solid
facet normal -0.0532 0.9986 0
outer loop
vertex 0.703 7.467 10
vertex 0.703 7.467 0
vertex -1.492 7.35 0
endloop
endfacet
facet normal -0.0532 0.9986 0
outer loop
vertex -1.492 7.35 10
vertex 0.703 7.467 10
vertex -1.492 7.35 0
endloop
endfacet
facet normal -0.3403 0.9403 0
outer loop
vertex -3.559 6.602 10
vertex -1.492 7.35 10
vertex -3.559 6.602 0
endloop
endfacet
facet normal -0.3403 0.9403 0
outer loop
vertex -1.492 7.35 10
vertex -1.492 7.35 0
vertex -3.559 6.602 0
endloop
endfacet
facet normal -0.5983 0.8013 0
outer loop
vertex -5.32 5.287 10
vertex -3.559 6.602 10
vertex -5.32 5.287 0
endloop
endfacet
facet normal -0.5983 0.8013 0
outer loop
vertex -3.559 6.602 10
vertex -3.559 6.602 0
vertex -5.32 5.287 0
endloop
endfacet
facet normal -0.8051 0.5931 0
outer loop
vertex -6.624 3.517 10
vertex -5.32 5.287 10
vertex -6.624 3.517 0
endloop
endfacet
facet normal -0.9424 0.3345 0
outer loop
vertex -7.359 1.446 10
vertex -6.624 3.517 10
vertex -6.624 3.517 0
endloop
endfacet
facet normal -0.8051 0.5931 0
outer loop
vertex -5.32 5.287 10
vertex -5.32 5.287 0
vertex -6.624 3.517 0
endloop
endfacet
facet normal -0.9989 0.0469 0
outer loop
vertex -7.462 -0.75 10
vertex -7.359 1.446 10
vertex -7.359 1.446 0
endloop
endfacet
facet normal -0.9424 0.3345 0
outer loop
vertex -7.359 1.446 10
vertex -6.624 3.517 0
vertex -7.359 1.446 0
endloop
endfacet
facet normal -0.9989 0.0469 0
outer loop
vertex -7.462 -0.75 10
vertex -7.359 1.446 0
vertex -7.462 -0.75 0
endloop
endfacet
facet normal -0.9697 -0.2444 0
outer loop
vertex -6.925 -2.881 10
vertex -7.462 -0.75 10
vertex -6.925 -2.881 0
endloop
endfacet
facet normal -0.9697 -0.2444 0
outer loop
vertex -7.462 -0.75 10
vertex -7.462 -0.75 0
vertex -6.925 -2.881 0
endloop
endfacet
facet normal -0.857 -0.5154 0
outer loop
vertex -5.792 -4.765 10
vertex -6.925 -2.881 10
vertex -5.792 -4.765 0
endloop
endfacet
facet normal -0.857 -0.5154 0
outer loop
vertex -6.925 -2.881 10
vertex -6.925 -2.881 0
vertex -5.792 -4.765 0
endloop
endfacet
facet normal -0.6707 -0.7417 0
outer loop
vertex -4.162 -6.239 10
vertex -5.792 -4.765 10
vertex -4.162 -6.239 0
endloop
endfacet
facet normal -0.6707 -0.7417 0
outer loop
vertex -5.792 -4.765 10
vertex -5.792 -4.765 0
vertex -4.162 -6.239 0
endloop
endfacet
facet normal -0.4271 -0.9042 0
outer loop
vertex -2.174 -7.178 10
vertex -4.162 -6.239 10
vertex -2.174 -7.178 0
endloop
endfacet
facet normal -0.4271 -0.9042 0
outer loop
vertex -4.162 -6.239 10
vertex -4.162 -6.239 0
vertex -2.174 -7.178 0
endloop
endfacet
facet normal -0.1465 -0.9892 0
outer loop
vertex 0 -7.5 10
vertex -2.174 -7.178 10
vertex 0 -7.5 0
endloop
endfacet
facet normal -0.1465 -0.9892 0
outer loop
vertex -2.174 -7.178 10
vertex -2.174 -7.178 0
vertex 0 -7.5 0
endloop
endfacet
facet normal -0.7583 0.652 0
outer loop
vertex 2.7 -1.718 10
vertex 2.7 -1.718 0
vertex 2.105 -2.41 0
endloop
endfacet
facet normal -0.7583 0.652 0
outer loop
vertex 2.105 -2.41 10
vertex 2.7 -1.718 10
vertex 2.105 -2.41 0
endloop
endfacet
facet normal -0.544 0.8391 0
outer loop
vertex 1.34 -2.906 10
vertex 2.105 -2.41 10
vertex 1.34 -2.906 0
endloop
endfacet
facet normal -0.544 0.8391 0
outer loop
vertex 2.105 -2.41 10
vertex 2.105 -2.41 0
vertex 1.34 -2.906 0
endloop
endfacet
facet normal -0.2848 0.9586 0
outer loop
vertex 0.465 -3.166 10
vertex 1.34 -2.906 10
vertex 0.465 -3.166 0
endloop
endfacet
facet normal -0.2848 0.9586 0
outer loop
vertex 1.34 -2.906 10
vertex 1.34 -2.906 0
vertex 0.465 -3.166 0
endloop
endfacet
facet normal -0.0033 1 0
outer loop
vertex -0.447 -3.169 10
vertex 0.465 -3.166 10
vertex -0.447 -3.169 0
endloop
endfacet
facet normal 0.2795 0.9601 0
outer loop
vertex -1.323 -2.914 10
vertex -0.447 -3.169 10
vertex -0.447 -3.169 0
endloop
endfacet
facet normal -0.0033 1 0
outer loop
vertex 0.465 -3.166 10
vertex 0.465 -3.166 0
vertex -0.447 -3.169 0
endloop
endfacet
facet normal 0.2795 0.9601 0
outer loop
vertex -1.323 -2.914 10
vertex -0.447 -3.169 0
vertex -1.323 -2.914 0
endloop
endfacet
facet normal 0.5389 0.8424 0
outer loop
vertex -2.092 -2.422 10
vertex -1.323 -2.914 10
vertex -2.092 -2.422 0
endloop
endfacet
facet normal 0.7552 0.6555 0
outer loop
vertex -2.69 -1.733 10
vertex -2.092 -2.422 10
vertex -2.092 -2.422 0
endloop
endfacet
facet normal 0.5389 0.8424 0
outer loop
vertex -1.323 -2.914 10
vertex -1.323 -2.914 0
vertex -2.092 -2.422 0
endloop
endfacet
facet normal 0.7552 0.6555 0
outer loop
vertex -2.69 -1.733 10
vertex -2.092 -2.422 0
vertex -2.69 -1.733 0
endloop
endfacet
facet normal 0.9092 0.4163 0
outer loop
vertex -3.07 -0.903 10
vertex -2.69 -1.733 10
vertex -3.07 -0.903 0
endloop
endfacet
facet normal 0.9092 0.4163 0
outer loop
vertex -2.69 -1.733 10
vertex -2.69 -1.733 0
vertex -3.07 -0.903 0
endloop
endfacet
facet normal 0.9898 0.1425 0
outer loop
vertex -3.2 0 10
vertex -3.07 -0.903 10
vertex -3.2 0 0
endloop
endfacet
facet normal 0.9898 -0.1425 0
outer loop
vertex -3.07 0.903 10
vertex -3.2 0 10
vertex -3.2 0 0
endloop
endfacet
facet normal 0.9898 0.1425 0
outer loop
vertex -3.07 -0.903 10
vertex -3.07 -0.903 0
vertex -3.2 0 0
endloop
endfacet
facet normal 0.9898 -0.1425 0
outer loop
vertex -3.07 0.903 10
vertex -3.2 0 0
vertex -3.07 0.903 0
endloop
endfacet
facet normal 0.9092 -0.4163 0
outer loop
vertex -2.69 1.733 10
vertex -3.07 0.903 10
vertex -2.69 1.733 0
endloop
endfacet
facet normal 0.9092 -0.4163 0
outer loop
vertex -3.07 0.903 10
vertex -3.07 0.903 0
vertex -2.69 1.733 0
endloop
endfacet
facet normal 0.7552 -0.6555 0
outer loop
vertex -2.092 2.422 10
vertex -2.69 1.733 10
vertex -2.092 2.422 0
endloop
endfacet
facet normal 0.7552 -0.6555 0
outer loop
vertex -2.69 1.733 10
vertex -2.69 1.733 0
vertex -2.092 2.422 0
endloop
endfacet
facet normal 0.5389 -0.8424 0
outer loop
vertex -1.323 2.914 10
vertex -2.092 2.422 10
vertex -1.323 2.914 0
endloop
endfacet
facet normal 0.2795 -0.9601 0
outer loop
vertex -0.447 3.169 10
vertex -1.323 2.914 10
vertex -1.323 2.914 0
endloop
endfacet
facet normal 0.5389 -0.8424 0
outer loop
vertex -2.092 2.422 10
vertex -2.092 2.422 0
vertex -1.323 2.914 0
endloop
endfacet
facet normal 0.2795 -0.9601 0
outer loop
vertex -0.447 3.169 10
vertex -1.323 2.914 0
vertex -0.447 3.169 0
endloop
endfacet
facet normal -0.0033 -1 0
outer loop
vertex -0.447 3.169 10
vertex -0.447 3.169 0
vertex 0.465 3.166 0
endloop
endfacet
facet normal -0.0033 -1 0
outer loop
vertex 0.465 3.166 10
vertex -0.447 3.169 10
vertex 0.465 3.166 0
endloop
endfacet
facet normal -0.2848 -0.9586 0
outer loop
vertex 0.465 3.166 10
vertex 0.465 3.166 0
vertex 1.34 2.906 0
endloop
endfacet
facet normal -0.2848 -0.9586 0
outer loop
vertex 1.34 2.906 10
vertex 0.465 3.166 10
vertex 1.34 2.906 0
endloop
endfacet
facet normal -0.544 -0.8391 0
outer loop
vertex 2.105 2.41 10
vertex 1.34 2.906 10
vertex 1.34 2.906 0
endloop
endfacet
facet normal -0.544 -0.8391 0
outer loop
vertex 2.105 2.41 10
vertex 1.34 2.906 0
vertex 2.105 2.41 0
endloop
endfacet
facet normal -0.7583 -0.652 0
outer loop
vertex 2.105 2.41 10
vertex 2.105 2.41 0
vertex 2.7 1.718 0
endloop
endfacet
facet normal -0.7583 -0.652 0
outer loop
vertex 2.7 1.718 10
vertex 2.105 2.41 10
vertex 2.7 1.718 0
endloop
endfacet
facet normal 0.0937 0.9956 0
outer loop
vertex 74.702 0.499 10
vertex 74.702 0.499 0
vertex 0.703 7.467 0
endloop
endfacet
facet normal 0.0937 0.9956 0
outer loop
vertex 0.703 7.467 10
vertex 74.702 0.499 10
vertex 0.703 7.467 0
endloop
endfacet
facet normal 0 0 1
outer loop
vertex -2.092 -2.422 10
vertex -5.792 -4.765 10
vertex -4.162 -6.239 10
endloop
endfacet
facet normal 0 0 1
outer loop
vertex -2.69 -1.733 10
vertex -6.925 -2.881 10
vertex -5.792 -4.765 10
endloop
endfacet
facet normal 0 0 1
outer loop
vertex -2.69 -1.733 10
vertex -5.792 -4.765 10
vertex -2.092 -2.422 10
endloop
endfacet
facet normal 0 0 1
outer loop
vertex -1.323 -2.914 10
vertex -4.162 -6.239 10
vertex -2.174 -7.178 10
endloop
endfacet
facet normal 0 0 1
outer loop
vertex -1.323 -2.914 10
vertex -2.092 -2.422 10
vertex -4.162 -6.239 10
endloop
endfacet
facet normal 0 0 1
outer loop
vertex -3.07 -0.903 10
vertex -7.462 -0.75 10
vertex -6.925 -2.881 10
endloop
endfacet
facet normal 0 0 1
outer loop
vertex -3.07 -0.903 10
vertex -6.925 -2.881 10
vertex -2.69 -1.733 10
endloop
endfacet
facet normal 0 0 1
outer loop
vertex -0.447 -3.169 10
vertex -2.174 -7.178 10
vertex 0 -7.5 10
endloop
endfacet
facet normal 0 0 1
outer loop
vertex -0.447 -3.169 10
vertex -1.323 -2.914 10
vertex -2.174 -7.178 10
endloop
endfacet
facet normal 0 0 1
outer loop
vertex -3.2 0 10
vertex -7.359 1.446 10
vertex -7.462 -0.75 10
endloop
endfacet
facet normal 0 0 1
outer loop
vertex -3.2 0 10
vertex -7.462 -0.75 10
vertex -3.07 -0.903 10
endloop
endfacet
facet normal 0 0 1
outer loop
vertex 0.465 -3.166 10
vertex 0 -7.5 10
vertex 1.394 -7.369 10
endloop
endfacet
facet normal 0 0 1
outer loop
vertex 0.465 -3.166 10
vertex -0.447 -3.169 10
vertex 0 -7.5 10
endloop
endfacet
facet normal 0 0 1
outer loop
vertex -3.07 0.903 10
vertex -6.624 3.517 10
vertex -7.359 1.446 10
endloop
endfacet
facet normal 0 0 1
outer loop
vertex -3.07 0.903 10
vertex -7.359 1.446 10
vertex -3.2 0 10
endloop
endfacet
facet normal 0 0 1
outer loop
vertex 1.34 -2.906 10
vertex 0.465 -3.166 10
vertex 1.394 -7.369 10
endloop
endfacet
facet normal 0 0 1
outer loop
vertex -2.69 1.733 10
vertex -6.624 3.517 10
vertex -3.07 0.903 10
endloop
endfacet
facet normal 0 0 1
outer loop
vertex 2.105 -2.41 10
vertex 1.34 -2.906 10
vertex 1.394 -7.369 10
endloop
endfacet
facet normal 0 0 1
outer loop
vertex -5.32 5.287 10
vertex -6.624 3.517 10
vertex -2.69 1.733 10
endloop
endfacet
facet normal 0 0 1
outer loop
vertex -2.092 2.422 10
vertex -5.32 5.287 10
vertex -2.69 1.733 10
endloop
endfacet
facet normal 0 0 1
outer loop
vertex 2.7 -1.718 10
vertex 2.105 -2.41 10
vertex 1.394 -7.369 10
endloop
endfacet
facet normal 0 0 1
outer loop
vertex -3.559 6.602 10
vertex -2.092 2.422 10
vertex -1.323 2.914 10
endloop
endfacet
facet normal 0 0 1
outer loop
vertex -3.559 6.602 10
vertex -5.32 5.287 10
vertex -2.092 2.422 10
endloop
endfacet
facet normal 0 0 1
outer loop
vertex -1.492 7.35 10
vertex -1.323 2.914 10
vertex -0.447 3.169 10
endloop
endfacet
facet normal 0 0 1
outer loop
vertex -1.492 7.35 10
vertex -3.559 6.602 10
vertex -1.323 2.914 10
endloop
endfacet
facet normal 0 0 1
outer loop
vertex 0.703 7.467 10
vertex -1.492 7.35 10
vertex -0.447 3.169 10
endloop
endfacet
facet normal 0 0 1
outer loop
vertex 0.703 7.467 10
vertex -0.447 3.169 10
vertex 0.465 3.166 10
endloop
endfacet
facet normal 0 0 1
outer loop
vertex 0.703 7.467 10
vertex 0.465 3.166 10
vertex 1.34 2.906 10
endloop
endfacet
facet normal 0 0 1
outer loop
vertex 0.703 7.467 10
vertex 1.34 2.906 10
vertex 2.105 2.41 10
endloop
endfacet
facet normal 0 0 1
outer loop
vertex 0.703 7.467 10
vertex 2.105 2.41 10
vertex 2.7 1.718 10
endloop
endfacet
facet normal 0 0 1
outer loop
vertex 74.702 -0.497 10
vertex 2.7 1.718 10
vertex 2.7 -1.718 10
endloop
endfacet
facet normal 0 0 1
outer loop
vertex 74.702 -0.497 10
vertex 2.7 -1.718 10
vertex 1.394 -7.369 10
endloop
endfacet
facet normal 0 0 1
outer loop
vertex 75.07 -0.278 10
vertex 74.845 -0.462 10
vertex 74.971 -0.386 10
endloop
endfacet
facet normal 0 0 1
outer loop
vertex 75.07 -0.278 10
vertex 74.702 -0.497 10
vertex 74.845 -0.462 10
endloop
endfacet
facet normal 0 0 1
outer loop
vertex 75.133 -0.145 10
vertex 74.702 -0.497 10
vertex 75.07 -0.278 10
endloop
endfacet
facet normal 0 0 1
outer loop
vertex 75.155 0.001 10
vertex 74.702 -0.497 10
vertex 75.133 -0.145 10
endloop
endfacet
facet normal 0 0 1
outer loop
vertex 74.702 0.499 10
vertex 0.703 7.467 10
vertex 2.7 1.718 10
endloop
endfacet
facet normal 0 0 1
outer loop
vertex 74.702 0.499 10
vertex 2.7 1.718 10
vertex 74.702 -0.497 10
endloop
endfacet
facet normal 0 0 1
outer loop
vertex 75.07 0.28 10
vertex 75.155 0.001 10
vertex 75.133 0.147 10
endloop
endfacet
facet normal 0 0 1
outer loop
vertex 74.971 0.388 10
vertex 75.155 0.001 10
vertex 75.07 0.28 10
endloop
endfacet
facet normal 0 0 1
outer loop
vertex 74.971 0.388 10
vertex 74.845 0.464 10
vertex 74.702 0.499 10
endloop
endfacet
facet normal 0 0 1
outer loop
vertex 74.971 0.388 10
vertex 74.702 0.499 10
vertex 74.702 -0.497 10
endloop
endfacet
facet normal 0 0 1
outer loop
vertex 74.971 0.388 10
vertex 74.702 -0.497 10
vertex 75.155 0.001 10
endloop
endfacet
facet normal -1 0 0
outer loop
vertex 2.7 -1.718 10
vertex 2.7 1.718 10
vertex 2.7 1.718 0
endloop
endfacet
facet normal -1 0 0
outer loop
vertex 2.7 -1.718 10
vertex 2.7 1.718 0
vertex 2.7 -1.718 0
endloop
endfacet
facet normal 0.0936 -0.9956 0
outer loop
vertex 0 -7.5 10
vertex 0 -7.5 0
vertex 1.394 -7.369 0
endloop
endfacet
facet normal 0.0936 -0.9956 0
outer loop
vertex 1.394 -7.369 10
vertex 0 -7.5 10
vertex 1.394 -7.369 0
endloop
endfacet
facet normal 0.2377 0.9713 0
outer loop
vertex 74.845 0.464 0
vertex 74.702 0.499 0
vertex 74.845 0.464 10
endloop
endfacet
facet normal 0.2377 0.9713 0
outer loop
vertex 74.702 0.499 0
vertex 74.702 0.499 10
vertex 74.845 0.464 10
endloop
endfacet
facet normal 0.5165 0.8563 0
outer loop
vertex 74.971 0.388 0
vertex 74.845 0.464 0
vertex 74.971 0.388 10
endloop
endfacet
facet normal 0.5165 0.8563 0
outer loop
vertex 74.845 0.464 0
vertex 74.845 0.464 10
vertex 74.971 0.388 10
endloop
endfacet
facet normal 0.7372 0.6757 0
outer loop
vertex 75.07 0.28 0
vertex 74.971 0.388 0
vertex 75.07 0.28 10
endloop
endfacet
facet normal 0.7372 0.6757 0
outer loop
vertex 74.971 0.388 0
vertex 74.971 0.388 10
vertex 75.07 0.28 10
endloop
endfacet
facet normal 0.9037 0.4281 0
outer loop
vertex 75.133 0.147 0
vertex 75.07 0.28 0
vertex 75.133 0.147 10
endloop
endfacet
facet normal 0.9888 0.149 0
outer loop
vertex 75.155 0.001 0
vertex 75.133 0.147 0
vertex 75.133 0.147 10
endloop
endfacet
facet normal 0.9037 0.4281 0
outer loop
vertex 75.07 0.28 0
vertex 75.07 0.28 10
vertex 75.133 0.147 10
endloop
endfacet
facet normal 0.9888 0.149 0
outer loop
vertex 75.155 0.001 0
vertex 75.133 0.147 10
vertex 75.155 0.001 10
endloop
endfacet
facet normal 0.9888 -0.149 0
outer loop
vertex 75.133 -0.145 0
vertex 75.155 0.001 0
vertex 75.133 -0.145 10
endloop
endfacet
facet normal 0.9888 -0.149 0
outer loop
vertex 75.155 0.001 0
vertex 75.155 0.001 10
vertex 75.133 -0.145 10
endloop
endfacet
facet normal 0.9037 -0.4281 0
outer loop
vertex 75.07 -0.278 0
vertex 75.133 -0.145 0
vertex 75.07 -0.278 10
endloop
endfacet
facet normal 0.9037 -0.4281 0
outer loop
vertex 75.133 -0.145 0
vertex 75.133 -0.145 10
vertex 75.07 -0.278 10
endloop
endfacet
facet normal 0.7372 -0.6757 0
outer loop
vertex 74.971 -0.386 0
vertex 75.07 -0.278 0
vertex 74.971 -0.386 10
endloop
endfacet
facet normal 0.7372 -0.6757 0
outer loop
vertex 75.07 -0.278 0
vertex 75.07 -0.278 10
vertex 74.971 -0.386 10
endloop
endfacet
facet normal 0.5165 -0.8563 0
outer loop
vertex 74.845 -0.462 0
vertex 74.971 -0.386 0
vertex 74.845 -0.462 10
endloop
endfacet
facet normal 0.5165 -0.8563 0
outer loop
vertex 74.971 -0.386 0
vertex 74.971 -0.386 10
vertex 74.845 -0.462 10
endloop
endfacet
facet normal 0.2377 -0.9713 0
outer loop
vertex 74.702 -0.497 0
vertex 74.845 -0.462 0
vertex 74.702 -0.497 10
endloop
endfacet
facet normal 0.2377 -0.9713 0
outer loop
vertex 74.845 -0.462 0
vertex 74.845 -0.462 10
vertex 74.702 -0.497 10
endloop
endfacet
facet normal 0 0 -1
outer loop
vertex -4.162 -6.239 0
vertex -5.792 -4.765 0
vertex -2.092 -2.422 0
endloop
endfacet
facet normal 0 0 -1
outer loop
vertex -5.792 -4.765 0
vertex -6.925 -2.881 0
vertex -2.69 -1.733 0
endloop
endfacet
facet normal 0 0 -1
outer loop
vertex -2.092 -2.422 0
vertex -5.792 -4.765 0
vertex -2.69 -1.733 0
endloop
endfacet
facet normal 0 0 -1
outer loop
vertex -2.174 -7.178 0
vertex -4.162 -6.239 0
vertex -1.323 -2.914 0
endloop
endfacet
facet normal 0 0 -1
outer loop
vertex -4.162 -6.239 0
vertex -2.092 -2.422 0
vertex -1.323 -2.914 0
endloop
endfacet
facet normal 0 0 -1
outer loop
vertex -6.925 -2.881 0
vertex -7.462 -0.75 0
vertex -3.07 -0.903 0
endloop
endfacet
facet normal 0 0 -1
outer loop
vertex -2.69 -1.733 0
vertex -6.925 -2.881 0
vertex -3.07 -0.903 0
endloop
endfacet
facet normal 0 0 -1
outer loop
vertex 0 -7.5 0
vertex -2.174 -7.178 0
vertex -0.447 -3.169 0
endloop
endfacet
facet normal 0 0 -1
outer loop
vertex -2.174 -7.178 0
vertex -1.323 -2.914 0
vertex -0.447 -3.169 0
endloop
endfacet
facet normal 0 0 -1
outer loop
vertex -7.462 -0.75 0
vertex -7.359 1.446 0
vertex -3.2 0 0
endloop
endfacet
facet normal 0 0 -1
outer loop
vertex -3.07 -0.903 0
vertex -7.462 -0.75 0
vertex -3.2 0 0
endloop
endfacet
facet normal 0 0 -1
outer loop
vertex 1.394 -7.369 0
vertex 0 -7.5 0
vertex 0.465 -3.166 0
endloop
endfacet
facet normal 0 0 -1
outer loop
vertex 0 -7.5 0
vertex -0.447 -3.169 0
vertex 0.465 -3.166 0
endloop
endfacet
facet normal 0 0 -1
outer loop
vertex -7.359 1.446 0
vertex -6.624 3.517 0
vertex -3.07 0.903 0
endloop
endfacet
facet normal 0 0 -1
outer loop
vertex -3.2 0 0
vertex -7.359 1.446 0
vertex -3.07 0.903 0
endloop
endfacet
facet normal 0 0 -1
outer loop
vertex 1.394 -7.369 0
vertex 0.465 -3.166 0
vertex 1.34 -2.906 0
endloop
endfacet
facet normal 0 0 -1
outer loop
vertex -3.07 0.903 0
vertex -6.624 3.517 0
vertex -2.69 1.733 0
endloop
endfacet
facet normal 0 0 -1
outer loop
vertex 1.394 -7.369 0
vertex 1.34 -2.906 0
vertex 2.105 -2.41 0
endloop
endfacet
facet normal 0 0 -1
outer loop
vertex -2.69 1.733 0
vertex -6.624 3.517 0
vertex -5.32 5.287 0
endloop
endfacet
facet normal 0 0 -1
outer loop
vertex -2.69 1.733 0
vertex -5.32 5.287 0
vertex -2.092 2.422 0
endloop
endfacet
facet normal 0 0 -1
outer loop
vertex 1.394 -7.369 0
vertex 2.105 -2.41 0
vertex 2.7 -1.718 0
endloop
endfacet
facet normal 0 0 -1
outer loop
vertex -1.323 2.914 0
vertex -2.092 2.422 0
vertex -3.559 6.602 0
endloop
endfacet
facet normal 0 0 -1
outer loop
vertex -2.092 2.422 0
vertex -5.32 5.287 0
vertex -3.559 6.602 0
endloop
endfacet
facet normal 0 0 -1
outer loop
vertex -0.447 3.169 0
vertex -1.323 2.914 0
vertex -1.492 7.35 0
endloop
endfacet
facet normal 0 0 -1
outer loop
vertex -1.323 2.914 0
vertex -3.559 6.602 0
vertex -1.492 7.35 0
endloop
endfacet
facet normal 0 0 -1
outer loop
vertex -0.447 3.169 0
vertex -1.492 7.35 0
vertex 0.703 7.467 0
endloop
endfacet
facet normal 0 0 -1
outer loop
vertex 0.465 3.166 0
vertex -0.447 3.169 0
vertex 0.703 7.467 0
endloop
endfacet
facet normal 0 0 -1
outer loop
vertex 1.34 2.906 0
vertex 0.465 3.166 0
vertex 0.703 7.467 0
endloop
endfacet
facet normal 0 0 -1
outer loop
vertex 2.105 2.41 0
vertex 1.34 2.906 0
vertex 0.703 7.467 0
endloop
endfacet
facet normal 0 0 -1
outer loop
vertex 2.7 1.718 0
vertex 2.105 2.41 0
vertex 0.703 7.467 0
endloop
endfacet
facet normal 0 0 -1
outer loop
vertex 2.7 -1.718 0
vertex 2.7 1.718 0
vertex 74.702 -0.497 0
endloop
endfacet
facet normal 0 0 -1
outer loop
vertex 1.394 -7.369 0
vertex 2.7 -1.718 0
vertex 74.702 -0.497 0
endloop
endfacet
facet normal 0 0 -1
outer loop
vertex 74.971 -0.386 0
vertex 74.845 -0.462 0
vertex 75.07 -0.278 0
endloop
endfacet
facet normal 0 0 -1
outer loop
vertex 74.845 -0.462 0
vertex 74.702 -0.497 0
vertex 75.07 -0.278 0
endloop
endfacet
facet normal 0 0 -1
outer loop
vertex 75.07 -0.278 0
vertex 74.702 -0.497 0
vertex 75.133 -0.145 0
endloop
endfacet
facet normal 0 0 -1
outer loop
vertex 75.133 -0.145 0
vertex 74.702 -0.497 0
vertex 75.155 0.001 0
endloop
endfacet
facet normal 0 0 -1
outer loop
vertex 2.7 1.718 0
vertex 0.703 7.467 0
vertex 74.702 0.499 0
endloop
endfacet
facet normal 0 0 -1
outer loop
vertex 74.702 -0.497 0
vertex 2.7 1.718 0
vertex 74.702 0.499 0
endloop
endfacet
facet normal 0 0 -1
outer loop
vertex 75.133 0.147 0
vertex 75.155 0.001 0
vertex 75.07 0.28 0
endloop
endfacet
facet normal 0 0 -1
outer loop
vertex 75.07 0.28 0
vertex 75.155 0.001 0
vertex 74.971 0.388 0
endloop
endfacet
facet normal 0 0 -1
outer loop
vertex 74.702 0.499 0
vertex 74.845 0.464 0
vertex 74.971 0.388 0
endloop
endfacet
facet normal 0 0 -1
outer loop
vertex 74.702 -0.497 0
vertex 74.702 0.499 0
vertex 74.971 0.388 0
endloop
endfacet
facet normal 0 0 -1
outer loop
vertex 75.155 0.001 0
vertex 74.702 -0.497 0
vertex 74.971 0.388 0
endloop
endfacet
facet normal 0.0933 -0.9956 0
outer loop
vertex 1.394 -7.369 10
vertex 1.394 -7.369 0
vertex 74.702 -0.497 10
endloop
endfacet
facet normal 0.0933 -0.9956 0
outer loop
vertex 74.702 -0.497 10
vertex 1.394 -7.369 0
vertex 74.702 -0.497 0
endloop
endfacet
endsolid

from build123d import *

# Parameters (mm, degrees)
F1_DEPTH = 10
F2_R     = 0.5


with BuildPart() as f1:
    # F0 (on Top) → F1 (new body)
    with BuildSketch(Plane.XY):
        with BuildLine():
            ThreePointArc((1.3939980639, -7.3693126815), (5.7751617068, -4.7851339856), (7.5, 0))
            ThreePointArc((7.5, 0), (5.5463248947, 5.048591899), (0.7031252901, 7.4669682487))
            ThreePointArc((0.7031252901, 7.4669682487), (-7.4917375109, 0.3519503765), (0, -7.5))
            Line((0, -7.5), (1.3939980639, -7.3693126815))
        make_face()
        with BuildLine():
            ThreePointArc((2.7, -1.7175564037), (-3.2, 0), (2.7, 1.7175564037))
            Line((2.7, 1.7175564037), (2.7, 0))
            Line((2.7, 0), (2.7, -1.7175564037))
        make_face(mode=Mode.SUBTRACT)
        with BuildLine():
            ThreePointArc((0.7031252901, 7.4669682487), (5.5463248947, 5.048591899), (7.5, 0))
            Line((7.5, 0), (80, 0))
            Line((80, 0), (0.7031252901, 7.4669682487))
        make_face()
        with BuildLine():
            Line((80, 0), (7.5, 0))
            ThreePointArc((7.5, 0), (5.7751617068, -4.7851339856), (1.3939980639, -7.3693126815))
            Line((1.3939980639, -7.3693126815), (80, 0))
        make_face()
    extrude(amount=F1_DEPTH)

    # F2
    f2_edges = [f1.edges().sort_by_distance(p)[0] for p in [
        (80, 0, 5),
    ]]
    fillet(f2_edges, radius=F2_R)


solid = f1.part
